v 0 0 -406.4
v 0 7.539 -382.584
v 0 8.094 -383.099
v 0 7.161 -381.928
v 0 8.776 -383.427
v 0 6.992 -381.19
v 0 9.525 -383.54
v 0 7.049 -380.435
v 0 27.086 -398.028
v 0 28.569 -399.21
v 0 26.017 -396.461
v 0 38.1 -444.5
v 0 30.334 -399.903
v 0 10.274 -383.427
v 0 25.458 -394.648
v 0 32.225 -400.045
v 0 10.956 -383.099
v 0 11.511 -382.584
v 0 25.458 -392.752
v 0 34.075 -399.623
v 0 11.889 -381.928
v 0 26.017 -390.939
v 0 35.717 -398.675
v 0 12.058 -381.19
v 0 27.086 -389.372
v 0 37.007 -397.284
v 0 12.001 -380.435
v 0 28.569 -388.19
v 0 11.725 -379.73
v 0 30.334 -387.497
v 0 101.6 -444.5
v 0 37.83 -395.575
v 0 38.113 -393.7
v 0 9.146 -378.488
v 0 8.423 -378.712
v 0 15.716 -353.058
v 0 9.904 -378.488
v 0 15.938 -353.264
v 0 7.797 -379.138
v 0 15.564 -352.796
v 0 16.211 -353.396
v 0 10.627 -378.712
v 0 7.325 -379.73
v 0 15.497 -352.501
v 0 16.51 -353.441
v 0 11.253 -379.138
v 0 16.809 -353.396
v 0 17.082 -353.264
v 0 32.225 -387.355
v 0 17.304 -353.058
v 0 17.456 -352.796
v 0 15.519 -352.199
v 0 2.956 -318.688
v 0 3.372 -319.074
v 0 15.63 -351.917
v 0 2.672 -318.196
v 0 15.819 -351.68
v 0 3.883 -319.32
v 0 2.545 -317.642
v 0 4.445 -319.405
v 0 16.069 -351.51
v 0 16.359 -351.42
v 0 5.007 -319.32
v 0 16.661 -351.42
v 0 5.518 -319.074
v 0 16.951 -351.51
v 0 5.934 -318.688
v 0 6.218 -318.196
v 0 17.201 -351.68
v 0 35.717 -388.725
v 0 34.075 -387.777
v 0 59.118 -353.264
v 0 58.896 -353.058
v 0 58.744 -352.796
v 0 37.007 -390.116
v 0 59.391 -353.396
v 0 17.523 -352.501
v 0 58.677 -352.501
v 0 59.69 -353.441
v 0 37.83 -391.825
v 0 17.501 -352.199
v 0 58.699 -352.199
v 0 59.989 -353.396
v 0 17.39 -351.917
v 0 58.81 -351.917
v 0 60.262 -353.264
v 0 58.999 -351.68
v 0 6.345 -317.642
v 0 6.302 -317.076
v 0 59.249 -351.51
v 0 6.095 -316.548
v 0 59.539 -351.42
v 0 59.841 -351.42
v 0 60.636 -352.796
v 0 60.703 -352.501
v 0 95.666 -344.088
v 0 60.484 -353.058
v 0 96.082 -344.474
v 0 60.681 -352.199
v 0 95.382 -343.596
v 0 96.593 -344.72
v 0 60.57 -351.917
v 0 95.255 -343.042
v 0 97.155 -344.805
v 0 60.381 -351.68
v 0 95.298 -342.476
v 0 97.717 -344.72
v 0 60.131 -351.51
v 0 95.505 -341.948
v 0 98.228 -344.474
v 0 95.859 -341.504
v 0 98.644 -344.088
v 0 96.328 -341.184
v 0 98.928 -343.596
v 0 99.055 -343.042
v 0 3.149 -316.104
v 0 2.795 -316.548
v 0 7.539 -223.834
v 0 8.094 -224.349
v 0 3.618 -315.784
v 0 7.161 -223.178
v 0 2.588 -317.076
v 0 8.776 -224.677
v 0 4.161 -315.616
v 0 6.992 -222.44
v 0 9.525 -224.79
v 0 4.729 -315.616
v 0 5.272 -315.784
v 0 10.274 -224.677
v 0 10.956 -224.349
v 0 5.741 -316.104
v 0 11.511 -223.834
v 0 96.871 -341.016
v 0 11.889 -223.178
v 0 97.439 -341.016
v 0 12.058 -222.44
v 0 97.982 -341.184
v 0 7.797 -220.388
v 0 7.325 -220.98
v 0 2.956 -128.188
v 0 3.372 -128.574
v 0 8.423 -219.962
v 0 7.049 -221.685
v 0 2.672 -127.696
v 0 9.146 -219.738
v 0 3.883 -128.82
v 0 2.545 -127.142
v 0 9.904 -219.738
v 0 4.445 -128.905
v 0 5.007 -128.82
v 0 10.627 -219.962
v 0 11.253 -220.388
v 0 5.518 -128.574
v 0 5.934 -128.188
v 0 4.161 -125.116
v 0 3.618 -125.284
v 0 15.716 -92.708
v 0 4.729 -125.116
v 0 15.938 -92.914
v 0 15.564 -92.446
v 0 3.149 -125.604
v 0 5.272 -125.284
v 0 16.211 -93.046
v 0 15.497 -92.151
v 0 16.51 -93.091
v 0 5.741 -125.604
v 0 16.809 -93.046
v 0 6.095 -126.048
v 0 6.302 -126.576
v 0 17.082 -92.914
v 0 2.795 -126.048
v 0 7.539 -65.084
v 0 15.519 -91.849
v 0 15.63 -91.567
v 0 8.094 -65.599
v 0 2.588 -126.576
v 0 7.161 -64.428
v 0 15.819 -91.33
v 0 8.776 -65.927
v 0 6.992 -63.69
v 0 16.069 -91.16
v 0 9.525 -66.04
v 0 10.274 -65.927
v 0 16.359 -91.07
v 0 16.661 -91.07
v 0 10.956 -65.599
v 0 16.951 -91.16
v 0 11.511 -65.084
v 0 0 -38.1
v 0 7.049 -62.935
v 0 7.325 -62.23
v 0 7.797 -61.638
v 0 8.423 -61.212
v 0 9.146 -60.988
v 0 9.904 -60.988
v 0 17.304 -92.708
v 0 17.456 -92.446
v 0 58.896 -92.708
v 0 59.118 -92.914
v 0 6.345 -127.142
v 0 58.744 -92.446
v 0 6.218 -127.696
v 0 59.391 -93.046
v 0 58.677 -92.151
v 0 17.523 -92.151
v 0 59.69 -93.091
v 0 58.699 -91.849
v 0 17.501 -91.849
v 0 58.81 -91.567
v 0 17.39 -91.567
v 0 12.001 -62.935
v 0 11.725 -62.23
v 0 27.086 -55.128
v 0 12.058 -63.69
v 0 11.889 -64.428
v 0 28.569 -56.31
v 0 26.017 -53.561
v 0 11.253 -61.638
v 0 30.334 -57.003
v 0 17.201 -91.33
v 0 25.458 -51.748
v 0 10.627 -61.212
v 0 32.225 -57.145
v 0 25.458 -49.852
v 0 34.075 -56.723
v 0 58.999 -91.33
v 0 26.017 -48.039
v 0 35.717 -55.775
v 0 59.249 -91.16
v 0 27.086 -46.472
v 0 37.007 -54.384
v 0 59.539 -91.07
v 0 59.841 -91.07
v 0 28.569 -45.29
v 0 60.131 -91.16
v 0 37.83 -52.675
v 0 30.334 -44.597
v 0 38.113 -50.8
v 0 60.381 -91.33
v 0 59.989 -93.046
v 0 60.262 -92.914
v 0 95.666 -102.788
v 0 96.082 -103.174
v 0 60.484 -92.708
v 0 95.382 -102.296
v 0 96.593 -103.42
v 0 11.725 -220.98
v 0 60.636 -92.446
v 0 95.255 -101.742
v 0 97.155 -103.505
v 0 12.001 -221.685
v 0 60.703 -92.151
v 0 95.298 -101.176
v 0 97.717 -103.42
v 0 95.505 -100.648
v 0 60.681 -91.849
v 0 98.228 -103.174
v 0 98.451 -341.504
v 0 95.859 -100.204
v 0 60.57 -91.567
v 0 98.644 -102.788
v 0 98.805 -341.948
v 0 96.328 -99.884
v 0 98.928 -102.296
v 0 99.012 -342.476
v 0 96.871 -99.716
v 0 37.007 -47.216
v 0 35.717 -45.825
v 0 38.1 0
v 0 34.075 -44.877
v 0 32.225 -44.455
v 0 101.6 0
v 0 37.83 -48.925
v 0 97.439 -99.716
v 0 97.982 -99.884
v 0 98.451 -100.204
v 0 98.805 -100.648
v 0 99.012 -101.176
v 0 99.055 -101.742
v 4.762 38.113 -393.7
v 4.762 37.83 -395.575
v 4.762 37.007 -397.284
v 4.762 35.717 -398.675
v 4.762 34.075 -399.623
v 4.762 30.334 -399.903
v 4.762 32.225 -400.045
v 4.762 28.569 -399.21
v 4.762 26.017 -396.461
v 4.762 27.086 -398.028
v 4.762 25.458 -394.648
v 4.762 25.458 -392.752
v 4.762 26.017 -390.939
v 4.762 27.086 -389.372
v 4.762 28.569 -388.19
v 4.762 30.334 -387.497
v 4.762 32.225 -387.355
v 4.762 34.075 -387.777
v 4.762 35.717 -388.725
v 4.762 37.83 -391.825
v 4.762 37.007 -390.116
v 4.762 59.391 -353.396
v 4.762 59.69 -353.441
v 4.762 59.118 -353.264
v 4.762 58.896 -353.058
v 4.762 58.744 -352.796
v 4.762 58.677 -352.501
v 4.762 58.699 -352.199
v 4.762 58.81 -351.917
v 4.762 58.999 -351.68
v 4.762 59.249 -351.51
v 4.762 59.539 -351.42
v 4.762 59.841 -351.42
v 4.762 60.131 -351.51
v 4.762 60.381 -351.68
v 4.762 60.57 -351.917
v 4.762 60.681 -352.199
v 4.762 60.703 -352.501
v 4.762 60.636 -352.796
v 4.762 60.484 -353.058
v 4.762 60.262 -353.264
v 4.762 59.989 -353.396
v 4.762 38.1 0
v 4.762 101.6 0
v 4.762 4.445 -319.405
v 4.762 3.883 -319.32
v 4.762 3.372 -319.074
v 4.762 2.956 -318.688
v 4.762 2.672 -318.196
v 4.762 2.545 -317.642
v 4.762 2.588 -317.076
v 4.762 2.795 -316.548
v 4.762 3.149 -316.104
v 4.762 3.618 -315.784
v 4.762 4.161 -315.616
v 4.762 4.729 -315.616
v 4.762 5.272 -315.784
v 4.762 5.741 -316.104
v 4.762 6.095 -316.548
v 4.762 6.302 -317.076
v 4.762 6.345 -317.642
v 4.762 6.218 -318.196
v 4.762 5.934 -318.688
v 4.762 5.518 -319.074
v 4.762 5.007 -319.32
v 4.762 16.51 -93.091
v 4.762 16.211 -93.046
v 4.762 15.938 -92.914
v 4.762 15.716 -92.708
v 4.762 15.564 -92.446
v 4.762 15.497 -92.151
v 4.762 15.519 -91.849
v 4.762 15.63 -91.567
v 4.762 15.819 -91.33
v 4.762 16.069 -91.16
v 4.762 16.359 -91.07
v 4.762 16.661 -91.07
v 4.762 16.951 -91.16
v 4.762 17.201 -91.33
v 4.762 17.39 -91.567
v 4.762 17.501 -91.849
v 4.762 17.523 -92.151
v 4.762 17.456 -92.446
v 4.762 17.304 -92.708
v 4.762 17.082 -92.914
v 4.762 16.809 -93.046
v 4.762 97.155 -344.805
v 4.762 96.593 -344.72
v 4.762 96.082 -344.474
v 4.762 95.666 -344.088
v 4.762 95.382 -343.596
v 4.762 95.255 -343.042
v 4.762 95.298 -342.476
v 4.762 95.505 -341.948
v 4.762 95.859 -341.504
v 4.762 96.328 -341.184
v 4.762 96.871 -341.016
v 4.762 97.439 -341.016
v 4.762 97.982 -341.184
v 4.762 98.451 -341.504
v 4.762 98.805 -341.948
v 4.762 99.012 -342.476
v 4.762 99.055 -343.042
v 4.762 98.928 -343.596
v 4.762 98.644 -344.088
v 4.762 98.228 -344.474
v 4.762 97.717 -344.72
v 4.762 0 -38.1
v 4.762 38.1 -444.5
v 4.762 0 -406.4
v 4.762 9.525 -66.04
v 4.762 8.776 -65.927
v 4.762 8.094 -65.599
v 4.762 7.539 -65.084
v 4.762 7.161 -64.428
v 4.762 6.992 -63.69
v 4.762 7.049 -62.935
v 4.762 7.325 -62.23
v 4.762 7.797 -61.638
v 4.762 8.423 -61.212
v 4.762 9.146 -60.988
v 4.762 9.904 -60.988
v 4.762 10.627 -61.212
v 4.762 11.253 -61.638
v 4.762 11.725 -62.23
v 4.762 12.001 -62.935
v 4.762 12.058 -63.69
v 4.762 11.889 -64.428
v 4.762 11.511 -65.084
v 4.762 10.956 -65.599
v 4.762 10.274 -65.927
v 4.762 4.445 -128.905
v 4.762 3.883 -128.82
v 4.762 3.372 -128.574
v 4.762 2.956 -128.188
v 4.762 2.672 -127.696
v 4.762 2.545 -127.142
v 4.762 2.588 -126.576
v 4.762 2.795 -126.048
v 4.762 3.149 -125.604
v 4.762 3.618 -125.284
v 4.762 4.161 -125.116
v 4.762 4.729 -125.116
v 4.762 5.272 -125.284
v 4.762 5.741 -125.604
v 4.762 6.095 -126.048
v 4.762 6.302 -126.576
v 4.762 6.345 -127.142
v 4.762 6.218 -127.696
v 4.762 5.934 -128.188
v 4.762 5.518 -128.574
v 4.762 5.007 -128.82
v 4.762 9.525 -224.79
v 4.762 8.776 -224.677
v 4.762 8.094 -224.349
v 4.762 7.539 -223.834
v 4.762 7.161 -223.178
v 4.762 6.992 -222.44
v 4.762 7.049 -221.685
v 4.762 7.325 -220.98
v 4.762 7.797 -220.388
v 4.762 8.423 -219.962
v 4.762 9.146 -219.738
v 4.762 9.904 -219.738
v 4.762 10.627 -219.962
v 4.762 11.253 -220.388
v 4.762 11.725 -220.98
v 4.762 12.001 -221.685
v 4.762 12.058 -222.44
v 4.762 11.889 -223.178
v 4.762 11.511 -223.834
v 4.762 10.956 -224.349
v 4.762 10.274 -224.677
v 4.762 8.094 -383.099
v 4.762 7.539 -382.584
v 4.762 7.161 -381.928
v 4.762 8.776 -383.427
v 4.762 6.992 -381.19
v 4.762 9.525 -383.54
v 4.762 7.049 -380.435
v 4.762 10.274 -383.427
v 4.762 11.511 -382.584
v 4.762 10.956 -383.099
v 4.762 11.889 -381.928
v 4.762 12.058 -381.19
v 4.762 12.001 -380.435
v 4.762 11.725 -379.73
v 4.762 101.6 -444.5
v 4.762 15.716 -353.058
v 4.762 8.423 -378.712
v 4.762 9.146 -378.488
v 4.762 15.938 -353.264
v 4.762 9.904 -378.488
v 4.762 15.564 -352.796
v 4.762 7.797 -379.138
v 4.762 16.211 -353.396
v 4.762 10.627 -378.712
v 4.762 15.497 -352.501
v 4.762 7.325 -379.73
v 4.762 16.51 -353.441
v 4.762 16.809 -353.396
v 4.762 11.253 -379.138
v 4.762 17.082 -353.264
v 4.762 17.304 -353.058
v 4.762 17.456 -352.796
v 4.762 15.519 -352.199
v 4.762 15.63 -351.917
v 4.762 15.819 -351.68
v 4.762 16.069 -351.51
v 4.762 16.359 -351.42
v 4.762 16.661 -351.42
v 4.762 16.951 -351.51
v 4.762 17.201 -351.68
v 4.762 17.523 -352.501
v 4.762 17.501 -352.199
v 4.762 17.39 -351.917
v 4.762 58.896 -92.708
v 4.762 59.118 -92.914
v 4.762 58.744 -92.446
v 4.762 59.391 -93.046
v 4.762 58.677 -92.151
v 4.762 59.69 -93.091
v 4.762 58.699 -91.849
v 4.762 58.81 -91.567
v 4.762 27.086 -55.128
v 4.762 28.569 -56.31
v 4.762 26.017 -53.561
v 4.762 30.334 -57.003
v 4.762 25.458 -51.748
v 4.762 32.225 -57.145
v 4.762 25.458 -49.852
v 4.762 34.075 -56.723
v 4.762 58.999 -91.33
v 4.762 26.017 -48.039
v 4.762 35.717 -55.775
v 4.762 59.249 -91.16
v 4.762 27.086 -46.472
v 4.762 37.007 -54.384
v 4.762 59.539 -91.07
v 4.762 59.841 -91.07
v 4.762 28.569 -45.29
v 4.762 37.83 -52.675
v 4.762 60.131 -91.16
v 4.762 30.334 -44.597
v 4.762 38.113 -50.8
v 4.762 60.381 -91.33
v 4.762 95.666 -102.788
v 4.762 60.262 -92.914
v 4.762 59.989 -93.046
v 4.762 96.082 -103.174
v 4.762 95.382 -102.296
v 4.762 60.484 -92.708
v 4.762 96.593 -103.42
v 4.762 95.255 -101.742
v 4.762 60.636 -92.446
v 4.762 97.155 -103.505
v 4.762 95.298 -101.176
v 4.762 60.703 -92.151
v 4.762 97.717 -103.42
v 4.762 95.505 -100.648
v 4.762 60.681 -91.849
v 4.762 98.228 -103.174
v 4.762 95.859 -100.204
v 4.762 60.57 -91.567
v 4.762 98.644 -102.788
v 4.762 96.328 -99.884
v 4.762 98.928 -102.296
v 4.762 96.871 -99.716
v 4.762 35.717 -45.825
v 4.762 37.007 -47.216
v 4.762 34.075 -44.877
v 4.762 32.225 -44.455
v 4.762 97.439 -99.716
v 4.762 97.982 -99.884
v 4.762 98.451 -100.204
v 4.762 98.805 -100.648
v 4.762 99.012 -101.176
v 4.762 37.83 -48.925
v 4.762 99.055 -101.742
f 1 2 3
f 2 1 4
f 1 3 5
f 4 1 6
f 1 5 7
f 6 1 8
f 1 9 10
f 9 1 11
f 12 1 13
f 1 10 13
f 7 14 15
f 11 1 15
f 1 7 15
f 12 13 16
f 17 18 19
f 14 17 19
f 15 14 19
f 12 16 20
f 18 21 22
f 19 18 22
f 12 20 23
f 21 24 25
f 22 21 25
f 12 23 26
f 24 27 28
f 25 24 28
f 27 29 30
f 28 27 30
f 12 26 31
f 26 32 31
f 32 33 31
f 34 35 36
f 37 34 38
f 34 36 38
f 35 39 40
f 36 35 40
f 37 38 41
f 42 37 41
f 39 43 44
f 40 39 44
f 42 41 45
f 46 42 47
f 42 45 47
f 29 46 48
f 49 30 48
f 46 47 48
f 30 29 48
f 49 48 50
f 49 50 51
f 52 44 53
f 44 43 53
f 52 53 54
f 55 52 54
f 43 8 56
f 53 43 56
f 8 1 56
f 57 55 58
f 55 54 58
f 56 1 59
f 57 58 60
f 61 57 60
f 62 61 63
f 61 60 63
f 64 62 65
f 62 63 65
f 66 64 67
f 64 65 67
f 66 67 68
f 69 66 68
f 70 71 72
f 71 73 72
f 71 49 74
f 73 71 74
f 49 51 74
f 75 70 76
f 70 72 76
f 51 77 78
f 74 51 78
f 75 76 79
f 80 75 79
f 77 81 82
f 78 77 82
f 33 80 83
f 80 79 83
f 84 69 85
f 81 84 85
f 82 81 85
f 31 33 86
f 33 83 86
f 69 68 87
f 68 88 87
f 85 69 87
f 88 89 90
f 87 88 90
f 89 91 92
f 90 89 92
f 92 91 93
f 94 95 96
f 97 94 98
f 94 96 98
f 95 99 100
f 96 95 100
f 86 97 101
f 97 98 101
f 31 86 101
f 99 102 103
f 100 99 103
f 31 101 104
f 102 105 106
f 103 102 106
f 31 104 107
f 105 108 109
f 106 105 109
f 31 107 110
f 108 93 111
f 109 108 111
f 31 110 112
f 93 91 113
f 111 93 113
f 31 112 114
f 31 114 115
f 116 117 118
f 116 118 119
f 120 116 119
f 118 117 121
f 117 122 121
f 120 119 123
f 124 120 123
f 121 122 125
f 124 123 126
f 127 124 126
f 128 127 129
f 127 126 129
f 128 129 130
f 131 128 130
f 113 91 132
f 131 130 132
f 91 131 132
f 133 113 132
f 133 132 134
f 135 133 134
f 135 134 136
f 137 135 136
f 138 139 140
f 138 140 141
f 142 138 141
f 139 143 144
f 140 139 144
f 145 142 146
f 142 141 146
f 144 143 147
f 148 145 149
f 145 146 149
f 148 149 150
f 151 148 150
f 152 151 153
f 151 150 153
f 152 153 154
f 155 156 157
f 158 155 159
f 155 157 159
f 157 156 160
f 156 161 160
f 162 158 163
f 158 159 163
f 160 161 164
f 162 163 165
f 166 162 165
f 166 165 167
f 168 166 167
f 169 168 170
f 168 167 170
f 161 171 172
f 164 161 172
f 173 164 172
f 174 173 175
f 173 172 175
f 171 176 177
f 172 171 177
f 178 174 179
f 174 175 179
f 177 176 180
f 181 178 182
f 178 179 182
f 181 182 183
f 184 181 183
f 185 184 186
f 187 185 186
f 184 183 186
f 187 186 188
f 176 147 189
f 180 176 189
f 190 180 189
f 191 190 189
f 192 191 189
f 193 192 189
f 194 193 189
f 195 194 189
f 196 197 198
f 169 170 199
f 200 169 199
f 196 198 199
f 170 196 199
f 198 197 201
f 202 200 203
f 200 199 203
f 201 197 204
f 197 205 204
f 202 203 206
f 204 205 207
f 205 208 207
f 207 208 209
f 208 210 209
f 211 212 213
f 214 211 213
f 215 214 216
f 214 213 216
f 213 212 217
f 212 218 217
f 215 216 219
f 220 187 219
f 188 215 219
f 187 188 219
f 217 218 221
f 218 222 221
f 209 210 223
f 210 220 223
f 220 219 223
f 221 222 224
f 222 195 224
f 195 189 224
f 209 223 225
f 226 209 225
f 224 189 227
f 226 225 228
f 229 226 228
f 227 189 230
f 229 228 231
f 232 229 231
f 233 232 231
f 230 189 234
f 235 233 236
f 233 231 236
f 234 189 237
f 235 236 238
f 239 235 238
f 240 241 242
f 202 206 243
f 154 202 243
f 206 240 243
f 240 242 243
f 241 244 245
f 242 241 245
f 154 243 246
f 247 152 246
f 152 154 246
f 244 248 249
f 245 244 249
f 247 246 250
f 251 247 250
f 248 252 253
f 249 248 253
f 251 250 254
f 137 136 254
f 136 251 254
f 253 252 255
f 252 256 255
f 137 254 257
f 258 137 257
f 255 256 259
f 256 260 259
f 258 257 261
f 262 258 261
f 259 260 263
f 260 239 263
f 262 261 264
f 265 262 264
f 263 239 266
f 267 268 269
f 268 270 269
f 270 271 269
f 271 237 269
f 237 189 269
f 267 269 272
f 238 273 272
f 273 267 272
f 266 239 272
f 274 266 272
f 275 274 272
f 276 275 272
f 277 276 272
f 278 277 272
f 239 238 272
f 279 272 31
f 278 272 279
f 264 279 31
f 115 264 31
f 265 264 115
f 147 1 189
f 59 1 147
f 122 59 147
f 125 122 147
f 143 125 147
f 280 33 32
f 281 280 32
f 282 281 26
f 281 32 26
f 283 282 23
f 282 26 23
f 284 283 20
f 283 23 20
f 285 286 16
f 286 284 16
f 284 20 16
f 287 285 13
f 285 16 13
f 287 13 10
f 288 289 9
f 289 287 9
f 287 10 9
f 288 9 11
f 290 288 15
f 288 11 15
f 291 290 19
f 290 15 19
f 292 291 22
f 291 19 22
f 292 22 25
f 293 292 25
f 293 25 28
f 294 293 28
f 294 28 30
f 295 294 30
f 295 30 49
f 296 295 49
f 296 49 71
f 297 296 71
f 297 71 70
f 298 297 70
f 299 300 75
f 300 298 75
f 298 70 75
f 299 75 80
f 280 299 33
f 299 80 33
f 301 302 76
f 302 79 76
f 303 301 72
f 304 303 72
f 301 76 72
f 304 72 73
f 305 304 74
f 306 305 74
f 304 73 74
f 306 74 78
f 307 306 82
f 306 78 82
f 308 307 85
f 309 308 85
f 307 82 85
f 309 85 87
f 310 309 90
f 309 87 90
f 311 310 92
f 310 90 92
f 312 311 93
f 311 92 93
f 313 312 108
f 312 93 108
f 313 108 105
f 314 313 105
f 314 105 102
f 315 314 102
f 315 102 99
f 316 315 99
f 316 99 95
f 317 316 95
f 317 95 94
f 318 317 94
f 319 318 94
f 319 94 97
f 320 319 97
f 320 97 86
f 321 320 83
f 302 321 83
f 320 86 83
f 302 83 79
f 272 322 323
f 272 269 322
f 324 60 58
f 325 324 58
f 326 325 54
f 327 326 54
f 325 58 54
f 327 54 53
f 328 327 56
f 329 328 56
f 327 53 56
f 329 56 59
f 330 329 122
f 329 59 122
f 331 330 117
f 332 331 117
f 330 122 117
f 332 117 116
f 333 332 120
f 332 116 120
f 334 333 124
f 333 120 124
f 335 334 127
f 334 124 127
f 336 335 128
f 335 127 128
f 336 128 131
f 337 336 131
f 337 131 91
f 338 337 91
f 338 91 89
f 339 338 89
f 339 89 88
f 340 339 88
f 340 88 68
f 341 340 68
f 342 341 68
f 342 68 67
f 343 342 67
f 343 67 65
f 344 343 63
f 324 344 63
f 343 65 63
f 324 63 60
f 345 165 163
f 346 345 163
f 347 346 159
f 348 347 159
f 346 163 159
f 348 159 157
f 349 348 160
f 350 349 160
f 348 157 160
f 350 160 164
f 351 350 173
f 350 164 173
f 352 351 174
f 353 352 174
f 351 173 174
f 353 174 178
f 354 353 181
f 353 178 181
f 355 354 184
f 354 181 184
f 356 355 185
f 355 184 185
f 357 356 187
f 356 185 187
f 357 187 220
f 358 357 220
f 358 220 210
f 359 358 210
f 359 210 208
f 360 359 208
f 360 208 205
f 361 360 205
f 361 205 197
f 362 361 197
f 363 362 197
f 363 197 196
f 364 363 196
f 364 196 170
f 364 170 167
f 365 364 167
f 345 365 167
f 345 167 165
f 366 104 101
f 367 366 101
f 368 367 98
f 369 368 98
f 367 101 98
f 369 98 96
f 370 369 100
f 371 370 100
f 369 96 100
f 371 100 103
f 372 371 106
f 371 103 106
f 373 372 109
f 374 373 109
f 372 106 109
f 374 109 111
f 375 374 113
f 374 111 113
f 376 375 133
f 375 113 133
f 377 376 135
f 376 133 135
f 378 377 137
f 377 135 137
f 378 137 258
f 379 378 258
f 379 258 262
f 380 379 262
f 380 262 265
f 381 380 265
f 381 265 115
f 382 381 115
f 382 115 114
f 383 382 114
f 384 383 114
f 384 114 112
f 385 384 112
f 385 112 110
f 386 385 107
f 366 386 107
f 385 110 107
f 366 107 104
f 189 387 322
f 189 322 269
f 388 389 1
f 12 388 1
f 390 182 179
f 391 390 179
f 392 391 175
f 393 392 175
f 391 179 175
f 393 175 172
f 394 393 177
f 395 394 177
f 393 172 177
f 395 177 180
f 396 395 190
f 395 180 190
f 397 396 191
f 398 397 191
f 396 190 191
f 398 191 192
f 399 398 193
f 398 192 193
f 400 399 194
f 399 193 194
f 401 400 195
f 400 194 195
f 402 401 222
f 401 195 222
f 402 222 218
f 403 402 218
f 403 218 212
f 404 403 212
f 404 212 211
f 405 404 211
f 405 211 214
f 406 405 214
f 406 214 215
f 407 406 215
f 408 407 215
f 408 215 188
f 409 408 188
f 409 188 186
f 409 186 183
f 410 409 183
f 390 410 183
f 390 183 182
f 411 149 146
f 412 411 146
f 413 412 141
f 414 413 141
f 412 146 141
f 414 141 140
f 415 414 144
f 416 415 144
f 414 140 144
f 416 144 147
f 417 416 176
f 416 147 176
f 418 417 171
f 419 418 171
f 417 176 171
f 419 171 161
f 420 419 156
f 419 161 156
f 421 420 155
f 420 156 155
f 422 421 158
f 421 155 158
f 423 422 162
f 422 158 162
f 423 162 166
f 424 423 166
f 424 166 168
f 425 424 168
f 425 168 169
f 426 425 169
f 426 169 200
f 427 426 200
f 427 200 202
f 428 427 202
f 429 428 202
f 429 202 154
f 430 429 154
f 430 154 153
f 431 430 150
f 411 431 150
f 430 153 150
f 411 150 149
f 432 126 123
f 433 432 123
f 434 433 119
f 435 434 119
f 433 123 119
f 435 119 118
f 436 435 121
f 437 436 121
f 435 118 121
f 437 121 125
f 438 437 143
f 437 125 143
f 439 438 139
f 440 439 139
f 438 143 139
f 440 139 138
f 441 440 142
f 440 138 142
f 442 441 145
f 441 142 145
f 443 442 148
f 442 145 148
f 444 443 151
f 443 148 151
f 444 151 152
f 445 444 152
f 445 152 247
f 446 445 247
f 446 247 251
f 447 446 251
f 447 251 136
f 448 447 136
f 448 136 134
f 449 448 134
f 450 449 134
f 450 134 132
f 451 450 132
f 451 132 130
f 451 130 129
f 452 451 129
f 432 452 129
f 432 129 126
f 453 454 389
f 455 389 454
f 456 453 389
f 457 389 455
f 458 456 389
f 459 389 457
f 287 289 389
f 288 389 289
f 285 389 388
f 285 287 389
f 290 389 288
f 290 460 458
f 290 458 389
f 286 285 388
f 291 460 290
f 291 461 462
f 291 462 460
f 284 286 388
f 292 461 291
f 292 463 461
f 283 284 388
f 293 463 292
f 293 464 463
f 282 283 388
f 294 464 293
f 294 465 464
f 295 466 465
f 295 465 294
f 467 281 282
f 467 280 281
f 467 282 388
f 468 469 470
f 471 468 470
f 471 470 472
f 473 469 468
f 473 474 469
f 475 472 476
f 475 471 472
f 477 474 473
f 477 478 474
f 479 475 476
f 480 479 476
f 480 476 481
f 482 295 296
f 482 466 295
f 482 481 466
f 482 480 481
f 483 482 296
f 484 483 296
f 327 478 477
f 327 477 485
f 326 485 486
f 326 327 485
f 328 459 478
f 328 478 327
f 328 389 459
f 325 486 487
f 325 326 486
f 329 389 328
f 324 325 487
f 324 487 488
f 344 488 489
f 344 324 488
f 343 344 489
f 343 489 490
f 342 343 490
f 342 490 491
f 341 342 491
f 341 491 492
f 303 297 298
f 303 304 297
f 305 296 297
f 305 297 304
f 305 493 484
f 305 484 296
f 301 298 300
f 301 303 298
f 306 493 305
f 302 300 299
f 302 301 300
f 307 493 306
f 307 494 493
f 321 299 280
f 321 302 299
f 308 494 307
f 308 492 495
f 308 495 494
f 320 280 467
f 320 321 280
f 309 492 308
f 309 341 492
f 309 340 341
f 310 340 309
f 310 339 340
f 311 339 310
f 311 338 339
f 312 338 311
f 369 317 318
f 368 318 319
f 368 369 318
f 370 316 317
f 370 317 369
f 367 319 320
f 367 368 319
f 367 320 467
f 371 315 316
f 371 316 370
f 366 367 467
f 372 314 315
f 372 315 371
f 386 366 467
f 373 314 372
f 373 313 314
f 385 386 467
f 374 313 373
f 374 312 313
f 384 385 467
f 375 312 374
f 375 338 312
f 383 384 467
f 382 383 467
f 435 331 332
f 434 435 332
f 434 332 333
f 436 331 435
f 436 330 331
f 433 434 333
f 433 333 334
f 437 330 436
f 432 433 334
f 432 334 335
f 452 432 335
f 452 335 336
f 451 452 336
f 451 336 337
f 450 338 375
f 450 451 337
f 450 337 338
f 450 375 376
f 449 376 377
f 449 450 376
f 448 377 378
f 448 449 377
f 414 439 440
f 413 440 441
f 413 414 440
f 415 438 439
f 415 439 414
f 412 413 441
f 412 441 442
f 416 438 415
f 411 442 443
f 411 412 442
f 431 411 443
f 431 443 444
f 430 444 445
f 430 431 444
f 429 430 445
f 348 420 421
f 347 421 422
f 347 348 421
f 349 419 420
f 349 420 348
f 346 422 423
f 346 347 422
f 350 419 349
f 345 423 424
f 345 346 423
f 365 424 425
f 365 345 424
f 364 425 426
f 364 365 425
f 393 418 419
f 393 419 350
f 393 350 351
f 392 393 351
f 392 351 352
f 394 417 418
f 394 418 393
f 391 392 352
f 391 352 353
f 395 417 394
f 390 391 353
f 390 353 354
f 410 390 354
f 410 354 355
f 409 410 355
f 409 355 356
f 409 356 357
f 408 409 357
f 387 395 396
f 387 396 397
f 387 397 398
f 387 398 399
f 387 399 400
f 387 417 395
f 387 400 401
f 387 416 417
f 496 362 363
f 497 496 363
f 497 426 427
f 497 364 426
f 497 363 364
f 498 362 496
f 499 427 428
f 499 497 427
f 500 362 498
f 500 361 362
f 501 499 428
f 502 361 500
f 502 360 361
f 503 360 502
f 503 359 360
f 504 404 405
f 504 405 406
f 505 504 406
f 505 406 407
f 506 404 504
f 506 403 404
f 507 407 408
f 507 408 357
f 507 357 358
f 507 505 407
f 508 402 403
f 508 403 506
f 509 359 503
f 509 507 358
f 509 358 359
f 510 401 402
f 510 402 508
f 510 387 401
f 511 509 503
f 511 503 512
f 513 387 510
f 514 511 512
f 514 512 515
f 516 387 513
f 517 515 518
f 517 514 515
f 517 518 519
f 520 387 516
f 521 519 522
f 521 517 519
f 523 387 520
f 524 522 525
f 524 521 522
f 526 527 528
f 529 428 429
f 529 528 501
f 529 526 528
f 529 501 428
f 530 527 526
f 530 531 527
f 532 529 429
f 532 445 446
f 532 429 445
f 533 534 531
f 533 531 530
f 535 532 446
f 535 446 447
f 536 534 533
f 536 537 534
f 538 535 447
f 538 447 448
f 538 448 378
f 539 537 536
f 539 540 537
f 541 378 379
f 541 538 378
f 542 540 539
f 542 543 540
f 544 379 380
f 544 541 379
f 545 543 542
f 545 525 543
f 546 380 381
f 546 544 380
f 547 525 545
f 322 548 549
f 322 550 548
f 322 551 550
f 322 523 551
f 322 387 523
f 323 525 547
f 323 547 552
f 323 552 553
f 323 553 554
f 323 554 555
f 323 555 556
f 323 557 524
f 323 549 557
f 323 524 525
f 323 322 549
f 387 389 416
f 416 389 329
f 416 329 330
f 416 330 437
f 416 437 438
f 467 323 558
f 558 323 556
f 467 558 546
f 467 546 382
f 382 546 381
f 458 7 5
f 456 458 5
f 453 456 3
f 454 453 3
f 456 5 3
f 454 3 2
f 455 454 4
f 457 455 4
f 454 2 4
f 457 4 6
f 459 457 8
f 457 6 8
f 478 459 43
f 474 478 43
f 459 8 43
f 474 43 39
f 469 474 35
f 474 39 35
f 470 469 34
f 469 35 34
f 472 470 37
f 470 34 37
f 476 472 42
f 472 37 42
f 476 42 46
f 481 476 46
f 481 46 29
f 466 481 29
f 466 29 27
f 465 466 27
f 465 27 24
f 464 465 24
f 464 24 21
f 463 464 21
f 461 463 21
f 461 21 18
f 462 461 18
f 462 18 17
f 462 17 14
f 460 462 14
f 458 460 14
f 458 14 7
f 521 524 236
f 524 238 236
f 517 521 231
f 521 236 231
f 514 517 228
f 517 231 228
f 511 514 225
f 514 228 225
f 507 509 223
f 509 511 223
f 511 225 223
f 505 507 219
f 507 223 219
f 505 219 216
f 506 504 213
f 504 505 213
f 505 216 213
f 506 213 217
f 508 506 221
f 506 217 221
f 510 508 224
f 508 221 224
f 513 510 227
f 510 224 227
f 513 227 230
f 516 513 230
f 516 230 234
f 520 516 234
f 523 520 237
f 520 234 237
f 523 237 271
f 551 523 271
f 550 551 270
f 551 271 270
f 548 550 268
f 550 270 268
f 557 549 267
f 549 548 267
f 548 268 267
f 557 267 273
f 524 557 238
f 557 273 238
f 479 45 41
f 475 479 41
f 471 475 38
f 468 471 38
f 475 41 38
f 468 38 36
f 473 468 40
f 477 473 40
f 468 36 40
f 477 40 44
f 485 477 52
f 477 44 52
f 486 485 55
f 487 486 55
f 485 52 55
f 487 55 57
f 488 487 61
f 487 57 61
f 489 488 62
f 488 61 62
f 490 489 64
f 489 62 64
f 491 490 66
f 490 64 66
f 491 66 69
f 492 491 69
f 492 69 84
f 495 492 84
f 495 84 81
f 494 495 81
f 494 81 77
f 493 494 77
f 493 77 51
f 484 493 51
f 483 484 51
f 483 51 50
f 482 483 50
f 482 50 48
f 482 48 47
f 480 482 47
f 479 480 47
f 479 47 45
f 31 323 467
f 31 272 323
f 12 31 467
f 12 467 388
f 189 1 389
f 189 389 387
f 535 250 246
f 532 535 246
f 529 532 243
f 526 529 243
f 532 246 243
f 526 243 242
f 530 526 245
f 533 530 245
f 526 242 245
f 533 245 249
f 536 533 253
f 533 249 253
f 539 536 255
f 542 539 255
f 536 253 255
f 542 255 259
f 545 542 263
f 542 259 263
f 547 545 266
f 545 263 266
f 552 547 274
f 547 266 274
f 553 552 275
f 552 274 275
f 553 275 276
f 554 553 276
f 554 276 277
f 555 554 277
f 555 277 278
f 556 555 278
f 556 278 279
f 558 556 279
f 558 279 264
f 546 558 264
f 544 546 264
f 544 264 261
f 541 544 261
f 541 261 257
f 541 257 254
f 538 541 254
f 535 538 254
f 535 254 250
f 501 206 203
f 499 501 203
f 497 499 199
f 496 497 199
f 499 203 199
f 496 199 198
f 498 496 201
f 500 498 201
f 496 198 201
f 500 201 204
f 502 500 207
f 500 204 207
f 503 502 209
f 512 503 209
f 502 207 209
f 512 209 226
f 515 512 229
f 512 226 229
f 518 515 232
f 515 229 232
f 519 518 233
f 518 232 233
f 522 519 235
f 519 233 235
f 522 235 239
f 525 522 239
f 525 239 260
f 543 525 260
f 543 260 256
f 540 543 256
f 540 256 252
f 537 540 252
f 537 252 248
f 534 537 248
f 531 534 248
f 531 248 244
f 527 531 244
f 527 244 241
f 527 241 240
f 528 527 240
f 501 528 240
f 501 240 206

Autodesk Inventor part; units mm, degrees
ref_plane "YZ Plane" through (0, 0, 0) normal (1, 0, 0) x (0, 1, 0)
ref_plane "XZ Plane" through (0, 0, 0) normal (0, 1, 0) x (-1, 0, 0)
ref_plane "XY Plane" through (0, 0, 0) normal (0, 0, 1) x (1, 0, 0)
sketch "Sketch1" plane through (0, 0, 0) normal (1, 0, 0) x (0, 1, 0)
  line L0 (0, 0) -> (101.6, 0)
  line L1 (101.6, 0) -> (101.6, -444.5)
  line L2 (101.6, -444.5) -> (0, -444.5)
  line L3 (0, -444.5) -> (0, 0)
  circle A0 centre (31.75, -50.8) radius 6.3627
  circle A1 centre (31.75, -393.7) radius 6.3627
  circle A2 centre (86.2838, -165.5318) radius 1.5875
  circle A3 centre (70.2818, -165.5318) radius 1.5875
  circle A4 centre (15.3162, -278.9682) radius 1.5875
  circle A5 centre (31.3182, -278.9682) radius 1.5875
  dimension "d0" = 101.6
  dimension "d1" = 444.5
  dimension "d2" = 12.7254
  dimension "d3" = 31.75
  dimension "d4" = 50.8
  dimension "d5" = 50.8
  dimension "d22" = 165.5318
  dimension "d23" = 3.175
  dimension "d24" = 15.3162
  dimension "d25" = 3.175
  dimension "d26" = 16.002
  dimension "d27" = 165.5318
  dimension "d28" = 3.175
  dimension "d29" = 15.3162
  dimension "d30" = 165.5318
  dimension "d31" = 3.175
  dimension "d32" = 16.002
  dimension "d33" = 165.5318
extrude "Extrusion1" add sketch "Sketch1" along normal blind 4.7625 contours L0 L1 L2 L3 | A2 | A3 | A4 | A5
chamfer "Chamfer1" distance 38.1 angle 45 1 edges at (2.3813, 0, 0)
chamfer "Chamfer2" distance 38.1 angle 45 1 edges at (2.3813, 0, -444.5)
sketch "Sketch7" plane through (4.7625, 0, 0) normal (1, 0, 0) x (0, 0, -1)
  line L0 (444.5, 38.1) -> (406.4, 0) projected
  line L1 (444.5, 38.1) -> (444.5, 101.6) projected
  line L2 (444.5, 101.6) -> (0, 101.6) projected
  line L3 (0, 101.6) -> (0, 38.1) projected
  line L4 (38.1, 0) -> (0, 38.1) projected
  line L5 (38.1, 0) -> (406.4, 0) projected
  circle A0 centre (393.7, 31.75) radius 6.3627 projected
  circle A1 centre (50.8, 31.75) radius 6.3627 projected
  point P0 (0, 0)
  point P1 (101.6, 97.155)
  point P2 (342.9, 97.155)
  point P3 (127, 4.445)
  point P4 (317.5, 4.445)
  dimension "d95" = 4.445
  dimension "d96" = 4.445
  dimension "d97" = 4.445
  dimension "d98" = 4.445
  dimension "d99" = 101.6
  dimension "d100" = 101.6
  dimension "d101" = 127
  dimension "d102" = 127
hole "Hole2" at (4.7625, 97.155, -101.6) at (4.7625, 97.155, -342.9) at (4.7625, 4.445, -127) at (4.7625, 4.445, -317.5) direction (-1, 0, 0) diameter 3.81 depth 25.4 tip angle 118
sketch "Sketch9" plane through (4.7625, 0, 0) normal (1, 0, 0) x (0, 0, -1)
  line L0 (444.5, 38.1) -> (444.5, 101.6) projected
  line L1 (38.1, 0) -> (406.4, 0) projected
  line L2 (0, 101.6) -> (0, 38.1) projected
  point P0 (0, 0)
  point P1 (352.425, 59.69)
  point P2 (352.425, 16.51)
  point P3 (92.075, 16.51)
  point P4 (92.075, 59.69)
  dimension "d115" = 43.18
  dimension "d116" = 92.075
  dimension "d117" = 92.075
  dimension "d118" = 16.51
  dimension "d119" = 92.075
  dimension "d120" = 92.075
  dimension "d121" = 43.18
  dimension "d122" = 16.51
hole "Hole3" at (4.7625, 59.69, -352.425) at (4.7625, 16.51, -352.425) at (4.7625, 16.51, -92.075) at (4.7625, 59.69, -92.075) direction (-1, 0, 0) diameter 2.032 depth 7.6708 tip angle 118
sketch "Sketch10" plane through (4.7625, 0, 0) normal (1, 0, 0) x (0, 0, -1)
  line L0 (38.1, 0) -> (406.4, 0) projected
  line L1 (0, 101.6) -> (0, 38.1) projected
  line L2 (444.5, 38.1) -> (444.5, 101.6) projected
  point P0 (0, 0)
  point P1 (63.5, 9.525)
  point P2 (222.25, 9.525)
  point P3 (381, 9.525)
  dimension "d130" = 9.525
  dimension "d131" = 63.5
  dimension "d132" = 63.5
  dimension "d133" = 317.5
  dimension "d134" = 158.75
  dimension "d135" = 9.525
hole "Hole4" at (4.7625, 9.525, -63.5) at (4.7625, 9.525, -222.25) at (4.7625, 9.525, -381) direction (-1, 0, 0) diameter 5.08 depth 19.05 tip angle 118
equation "\"d96\" = d95"
equation "\"d97\" = d95"
equation "\"d98\" = d95"
equation "\"d100\" = d99"
equation "\"d117\" = d116"
equation "\"d119\" = d117"
equation "\"d120\" = d117"
equation "\"d121\" = d115"
equation "\"d122\" = d118"
equation "\"d132\" = d131"
equation "\"d134\" = 0.5 * d133"
properties part number "DriveTrain3.0" material "Aluminum 6061"
